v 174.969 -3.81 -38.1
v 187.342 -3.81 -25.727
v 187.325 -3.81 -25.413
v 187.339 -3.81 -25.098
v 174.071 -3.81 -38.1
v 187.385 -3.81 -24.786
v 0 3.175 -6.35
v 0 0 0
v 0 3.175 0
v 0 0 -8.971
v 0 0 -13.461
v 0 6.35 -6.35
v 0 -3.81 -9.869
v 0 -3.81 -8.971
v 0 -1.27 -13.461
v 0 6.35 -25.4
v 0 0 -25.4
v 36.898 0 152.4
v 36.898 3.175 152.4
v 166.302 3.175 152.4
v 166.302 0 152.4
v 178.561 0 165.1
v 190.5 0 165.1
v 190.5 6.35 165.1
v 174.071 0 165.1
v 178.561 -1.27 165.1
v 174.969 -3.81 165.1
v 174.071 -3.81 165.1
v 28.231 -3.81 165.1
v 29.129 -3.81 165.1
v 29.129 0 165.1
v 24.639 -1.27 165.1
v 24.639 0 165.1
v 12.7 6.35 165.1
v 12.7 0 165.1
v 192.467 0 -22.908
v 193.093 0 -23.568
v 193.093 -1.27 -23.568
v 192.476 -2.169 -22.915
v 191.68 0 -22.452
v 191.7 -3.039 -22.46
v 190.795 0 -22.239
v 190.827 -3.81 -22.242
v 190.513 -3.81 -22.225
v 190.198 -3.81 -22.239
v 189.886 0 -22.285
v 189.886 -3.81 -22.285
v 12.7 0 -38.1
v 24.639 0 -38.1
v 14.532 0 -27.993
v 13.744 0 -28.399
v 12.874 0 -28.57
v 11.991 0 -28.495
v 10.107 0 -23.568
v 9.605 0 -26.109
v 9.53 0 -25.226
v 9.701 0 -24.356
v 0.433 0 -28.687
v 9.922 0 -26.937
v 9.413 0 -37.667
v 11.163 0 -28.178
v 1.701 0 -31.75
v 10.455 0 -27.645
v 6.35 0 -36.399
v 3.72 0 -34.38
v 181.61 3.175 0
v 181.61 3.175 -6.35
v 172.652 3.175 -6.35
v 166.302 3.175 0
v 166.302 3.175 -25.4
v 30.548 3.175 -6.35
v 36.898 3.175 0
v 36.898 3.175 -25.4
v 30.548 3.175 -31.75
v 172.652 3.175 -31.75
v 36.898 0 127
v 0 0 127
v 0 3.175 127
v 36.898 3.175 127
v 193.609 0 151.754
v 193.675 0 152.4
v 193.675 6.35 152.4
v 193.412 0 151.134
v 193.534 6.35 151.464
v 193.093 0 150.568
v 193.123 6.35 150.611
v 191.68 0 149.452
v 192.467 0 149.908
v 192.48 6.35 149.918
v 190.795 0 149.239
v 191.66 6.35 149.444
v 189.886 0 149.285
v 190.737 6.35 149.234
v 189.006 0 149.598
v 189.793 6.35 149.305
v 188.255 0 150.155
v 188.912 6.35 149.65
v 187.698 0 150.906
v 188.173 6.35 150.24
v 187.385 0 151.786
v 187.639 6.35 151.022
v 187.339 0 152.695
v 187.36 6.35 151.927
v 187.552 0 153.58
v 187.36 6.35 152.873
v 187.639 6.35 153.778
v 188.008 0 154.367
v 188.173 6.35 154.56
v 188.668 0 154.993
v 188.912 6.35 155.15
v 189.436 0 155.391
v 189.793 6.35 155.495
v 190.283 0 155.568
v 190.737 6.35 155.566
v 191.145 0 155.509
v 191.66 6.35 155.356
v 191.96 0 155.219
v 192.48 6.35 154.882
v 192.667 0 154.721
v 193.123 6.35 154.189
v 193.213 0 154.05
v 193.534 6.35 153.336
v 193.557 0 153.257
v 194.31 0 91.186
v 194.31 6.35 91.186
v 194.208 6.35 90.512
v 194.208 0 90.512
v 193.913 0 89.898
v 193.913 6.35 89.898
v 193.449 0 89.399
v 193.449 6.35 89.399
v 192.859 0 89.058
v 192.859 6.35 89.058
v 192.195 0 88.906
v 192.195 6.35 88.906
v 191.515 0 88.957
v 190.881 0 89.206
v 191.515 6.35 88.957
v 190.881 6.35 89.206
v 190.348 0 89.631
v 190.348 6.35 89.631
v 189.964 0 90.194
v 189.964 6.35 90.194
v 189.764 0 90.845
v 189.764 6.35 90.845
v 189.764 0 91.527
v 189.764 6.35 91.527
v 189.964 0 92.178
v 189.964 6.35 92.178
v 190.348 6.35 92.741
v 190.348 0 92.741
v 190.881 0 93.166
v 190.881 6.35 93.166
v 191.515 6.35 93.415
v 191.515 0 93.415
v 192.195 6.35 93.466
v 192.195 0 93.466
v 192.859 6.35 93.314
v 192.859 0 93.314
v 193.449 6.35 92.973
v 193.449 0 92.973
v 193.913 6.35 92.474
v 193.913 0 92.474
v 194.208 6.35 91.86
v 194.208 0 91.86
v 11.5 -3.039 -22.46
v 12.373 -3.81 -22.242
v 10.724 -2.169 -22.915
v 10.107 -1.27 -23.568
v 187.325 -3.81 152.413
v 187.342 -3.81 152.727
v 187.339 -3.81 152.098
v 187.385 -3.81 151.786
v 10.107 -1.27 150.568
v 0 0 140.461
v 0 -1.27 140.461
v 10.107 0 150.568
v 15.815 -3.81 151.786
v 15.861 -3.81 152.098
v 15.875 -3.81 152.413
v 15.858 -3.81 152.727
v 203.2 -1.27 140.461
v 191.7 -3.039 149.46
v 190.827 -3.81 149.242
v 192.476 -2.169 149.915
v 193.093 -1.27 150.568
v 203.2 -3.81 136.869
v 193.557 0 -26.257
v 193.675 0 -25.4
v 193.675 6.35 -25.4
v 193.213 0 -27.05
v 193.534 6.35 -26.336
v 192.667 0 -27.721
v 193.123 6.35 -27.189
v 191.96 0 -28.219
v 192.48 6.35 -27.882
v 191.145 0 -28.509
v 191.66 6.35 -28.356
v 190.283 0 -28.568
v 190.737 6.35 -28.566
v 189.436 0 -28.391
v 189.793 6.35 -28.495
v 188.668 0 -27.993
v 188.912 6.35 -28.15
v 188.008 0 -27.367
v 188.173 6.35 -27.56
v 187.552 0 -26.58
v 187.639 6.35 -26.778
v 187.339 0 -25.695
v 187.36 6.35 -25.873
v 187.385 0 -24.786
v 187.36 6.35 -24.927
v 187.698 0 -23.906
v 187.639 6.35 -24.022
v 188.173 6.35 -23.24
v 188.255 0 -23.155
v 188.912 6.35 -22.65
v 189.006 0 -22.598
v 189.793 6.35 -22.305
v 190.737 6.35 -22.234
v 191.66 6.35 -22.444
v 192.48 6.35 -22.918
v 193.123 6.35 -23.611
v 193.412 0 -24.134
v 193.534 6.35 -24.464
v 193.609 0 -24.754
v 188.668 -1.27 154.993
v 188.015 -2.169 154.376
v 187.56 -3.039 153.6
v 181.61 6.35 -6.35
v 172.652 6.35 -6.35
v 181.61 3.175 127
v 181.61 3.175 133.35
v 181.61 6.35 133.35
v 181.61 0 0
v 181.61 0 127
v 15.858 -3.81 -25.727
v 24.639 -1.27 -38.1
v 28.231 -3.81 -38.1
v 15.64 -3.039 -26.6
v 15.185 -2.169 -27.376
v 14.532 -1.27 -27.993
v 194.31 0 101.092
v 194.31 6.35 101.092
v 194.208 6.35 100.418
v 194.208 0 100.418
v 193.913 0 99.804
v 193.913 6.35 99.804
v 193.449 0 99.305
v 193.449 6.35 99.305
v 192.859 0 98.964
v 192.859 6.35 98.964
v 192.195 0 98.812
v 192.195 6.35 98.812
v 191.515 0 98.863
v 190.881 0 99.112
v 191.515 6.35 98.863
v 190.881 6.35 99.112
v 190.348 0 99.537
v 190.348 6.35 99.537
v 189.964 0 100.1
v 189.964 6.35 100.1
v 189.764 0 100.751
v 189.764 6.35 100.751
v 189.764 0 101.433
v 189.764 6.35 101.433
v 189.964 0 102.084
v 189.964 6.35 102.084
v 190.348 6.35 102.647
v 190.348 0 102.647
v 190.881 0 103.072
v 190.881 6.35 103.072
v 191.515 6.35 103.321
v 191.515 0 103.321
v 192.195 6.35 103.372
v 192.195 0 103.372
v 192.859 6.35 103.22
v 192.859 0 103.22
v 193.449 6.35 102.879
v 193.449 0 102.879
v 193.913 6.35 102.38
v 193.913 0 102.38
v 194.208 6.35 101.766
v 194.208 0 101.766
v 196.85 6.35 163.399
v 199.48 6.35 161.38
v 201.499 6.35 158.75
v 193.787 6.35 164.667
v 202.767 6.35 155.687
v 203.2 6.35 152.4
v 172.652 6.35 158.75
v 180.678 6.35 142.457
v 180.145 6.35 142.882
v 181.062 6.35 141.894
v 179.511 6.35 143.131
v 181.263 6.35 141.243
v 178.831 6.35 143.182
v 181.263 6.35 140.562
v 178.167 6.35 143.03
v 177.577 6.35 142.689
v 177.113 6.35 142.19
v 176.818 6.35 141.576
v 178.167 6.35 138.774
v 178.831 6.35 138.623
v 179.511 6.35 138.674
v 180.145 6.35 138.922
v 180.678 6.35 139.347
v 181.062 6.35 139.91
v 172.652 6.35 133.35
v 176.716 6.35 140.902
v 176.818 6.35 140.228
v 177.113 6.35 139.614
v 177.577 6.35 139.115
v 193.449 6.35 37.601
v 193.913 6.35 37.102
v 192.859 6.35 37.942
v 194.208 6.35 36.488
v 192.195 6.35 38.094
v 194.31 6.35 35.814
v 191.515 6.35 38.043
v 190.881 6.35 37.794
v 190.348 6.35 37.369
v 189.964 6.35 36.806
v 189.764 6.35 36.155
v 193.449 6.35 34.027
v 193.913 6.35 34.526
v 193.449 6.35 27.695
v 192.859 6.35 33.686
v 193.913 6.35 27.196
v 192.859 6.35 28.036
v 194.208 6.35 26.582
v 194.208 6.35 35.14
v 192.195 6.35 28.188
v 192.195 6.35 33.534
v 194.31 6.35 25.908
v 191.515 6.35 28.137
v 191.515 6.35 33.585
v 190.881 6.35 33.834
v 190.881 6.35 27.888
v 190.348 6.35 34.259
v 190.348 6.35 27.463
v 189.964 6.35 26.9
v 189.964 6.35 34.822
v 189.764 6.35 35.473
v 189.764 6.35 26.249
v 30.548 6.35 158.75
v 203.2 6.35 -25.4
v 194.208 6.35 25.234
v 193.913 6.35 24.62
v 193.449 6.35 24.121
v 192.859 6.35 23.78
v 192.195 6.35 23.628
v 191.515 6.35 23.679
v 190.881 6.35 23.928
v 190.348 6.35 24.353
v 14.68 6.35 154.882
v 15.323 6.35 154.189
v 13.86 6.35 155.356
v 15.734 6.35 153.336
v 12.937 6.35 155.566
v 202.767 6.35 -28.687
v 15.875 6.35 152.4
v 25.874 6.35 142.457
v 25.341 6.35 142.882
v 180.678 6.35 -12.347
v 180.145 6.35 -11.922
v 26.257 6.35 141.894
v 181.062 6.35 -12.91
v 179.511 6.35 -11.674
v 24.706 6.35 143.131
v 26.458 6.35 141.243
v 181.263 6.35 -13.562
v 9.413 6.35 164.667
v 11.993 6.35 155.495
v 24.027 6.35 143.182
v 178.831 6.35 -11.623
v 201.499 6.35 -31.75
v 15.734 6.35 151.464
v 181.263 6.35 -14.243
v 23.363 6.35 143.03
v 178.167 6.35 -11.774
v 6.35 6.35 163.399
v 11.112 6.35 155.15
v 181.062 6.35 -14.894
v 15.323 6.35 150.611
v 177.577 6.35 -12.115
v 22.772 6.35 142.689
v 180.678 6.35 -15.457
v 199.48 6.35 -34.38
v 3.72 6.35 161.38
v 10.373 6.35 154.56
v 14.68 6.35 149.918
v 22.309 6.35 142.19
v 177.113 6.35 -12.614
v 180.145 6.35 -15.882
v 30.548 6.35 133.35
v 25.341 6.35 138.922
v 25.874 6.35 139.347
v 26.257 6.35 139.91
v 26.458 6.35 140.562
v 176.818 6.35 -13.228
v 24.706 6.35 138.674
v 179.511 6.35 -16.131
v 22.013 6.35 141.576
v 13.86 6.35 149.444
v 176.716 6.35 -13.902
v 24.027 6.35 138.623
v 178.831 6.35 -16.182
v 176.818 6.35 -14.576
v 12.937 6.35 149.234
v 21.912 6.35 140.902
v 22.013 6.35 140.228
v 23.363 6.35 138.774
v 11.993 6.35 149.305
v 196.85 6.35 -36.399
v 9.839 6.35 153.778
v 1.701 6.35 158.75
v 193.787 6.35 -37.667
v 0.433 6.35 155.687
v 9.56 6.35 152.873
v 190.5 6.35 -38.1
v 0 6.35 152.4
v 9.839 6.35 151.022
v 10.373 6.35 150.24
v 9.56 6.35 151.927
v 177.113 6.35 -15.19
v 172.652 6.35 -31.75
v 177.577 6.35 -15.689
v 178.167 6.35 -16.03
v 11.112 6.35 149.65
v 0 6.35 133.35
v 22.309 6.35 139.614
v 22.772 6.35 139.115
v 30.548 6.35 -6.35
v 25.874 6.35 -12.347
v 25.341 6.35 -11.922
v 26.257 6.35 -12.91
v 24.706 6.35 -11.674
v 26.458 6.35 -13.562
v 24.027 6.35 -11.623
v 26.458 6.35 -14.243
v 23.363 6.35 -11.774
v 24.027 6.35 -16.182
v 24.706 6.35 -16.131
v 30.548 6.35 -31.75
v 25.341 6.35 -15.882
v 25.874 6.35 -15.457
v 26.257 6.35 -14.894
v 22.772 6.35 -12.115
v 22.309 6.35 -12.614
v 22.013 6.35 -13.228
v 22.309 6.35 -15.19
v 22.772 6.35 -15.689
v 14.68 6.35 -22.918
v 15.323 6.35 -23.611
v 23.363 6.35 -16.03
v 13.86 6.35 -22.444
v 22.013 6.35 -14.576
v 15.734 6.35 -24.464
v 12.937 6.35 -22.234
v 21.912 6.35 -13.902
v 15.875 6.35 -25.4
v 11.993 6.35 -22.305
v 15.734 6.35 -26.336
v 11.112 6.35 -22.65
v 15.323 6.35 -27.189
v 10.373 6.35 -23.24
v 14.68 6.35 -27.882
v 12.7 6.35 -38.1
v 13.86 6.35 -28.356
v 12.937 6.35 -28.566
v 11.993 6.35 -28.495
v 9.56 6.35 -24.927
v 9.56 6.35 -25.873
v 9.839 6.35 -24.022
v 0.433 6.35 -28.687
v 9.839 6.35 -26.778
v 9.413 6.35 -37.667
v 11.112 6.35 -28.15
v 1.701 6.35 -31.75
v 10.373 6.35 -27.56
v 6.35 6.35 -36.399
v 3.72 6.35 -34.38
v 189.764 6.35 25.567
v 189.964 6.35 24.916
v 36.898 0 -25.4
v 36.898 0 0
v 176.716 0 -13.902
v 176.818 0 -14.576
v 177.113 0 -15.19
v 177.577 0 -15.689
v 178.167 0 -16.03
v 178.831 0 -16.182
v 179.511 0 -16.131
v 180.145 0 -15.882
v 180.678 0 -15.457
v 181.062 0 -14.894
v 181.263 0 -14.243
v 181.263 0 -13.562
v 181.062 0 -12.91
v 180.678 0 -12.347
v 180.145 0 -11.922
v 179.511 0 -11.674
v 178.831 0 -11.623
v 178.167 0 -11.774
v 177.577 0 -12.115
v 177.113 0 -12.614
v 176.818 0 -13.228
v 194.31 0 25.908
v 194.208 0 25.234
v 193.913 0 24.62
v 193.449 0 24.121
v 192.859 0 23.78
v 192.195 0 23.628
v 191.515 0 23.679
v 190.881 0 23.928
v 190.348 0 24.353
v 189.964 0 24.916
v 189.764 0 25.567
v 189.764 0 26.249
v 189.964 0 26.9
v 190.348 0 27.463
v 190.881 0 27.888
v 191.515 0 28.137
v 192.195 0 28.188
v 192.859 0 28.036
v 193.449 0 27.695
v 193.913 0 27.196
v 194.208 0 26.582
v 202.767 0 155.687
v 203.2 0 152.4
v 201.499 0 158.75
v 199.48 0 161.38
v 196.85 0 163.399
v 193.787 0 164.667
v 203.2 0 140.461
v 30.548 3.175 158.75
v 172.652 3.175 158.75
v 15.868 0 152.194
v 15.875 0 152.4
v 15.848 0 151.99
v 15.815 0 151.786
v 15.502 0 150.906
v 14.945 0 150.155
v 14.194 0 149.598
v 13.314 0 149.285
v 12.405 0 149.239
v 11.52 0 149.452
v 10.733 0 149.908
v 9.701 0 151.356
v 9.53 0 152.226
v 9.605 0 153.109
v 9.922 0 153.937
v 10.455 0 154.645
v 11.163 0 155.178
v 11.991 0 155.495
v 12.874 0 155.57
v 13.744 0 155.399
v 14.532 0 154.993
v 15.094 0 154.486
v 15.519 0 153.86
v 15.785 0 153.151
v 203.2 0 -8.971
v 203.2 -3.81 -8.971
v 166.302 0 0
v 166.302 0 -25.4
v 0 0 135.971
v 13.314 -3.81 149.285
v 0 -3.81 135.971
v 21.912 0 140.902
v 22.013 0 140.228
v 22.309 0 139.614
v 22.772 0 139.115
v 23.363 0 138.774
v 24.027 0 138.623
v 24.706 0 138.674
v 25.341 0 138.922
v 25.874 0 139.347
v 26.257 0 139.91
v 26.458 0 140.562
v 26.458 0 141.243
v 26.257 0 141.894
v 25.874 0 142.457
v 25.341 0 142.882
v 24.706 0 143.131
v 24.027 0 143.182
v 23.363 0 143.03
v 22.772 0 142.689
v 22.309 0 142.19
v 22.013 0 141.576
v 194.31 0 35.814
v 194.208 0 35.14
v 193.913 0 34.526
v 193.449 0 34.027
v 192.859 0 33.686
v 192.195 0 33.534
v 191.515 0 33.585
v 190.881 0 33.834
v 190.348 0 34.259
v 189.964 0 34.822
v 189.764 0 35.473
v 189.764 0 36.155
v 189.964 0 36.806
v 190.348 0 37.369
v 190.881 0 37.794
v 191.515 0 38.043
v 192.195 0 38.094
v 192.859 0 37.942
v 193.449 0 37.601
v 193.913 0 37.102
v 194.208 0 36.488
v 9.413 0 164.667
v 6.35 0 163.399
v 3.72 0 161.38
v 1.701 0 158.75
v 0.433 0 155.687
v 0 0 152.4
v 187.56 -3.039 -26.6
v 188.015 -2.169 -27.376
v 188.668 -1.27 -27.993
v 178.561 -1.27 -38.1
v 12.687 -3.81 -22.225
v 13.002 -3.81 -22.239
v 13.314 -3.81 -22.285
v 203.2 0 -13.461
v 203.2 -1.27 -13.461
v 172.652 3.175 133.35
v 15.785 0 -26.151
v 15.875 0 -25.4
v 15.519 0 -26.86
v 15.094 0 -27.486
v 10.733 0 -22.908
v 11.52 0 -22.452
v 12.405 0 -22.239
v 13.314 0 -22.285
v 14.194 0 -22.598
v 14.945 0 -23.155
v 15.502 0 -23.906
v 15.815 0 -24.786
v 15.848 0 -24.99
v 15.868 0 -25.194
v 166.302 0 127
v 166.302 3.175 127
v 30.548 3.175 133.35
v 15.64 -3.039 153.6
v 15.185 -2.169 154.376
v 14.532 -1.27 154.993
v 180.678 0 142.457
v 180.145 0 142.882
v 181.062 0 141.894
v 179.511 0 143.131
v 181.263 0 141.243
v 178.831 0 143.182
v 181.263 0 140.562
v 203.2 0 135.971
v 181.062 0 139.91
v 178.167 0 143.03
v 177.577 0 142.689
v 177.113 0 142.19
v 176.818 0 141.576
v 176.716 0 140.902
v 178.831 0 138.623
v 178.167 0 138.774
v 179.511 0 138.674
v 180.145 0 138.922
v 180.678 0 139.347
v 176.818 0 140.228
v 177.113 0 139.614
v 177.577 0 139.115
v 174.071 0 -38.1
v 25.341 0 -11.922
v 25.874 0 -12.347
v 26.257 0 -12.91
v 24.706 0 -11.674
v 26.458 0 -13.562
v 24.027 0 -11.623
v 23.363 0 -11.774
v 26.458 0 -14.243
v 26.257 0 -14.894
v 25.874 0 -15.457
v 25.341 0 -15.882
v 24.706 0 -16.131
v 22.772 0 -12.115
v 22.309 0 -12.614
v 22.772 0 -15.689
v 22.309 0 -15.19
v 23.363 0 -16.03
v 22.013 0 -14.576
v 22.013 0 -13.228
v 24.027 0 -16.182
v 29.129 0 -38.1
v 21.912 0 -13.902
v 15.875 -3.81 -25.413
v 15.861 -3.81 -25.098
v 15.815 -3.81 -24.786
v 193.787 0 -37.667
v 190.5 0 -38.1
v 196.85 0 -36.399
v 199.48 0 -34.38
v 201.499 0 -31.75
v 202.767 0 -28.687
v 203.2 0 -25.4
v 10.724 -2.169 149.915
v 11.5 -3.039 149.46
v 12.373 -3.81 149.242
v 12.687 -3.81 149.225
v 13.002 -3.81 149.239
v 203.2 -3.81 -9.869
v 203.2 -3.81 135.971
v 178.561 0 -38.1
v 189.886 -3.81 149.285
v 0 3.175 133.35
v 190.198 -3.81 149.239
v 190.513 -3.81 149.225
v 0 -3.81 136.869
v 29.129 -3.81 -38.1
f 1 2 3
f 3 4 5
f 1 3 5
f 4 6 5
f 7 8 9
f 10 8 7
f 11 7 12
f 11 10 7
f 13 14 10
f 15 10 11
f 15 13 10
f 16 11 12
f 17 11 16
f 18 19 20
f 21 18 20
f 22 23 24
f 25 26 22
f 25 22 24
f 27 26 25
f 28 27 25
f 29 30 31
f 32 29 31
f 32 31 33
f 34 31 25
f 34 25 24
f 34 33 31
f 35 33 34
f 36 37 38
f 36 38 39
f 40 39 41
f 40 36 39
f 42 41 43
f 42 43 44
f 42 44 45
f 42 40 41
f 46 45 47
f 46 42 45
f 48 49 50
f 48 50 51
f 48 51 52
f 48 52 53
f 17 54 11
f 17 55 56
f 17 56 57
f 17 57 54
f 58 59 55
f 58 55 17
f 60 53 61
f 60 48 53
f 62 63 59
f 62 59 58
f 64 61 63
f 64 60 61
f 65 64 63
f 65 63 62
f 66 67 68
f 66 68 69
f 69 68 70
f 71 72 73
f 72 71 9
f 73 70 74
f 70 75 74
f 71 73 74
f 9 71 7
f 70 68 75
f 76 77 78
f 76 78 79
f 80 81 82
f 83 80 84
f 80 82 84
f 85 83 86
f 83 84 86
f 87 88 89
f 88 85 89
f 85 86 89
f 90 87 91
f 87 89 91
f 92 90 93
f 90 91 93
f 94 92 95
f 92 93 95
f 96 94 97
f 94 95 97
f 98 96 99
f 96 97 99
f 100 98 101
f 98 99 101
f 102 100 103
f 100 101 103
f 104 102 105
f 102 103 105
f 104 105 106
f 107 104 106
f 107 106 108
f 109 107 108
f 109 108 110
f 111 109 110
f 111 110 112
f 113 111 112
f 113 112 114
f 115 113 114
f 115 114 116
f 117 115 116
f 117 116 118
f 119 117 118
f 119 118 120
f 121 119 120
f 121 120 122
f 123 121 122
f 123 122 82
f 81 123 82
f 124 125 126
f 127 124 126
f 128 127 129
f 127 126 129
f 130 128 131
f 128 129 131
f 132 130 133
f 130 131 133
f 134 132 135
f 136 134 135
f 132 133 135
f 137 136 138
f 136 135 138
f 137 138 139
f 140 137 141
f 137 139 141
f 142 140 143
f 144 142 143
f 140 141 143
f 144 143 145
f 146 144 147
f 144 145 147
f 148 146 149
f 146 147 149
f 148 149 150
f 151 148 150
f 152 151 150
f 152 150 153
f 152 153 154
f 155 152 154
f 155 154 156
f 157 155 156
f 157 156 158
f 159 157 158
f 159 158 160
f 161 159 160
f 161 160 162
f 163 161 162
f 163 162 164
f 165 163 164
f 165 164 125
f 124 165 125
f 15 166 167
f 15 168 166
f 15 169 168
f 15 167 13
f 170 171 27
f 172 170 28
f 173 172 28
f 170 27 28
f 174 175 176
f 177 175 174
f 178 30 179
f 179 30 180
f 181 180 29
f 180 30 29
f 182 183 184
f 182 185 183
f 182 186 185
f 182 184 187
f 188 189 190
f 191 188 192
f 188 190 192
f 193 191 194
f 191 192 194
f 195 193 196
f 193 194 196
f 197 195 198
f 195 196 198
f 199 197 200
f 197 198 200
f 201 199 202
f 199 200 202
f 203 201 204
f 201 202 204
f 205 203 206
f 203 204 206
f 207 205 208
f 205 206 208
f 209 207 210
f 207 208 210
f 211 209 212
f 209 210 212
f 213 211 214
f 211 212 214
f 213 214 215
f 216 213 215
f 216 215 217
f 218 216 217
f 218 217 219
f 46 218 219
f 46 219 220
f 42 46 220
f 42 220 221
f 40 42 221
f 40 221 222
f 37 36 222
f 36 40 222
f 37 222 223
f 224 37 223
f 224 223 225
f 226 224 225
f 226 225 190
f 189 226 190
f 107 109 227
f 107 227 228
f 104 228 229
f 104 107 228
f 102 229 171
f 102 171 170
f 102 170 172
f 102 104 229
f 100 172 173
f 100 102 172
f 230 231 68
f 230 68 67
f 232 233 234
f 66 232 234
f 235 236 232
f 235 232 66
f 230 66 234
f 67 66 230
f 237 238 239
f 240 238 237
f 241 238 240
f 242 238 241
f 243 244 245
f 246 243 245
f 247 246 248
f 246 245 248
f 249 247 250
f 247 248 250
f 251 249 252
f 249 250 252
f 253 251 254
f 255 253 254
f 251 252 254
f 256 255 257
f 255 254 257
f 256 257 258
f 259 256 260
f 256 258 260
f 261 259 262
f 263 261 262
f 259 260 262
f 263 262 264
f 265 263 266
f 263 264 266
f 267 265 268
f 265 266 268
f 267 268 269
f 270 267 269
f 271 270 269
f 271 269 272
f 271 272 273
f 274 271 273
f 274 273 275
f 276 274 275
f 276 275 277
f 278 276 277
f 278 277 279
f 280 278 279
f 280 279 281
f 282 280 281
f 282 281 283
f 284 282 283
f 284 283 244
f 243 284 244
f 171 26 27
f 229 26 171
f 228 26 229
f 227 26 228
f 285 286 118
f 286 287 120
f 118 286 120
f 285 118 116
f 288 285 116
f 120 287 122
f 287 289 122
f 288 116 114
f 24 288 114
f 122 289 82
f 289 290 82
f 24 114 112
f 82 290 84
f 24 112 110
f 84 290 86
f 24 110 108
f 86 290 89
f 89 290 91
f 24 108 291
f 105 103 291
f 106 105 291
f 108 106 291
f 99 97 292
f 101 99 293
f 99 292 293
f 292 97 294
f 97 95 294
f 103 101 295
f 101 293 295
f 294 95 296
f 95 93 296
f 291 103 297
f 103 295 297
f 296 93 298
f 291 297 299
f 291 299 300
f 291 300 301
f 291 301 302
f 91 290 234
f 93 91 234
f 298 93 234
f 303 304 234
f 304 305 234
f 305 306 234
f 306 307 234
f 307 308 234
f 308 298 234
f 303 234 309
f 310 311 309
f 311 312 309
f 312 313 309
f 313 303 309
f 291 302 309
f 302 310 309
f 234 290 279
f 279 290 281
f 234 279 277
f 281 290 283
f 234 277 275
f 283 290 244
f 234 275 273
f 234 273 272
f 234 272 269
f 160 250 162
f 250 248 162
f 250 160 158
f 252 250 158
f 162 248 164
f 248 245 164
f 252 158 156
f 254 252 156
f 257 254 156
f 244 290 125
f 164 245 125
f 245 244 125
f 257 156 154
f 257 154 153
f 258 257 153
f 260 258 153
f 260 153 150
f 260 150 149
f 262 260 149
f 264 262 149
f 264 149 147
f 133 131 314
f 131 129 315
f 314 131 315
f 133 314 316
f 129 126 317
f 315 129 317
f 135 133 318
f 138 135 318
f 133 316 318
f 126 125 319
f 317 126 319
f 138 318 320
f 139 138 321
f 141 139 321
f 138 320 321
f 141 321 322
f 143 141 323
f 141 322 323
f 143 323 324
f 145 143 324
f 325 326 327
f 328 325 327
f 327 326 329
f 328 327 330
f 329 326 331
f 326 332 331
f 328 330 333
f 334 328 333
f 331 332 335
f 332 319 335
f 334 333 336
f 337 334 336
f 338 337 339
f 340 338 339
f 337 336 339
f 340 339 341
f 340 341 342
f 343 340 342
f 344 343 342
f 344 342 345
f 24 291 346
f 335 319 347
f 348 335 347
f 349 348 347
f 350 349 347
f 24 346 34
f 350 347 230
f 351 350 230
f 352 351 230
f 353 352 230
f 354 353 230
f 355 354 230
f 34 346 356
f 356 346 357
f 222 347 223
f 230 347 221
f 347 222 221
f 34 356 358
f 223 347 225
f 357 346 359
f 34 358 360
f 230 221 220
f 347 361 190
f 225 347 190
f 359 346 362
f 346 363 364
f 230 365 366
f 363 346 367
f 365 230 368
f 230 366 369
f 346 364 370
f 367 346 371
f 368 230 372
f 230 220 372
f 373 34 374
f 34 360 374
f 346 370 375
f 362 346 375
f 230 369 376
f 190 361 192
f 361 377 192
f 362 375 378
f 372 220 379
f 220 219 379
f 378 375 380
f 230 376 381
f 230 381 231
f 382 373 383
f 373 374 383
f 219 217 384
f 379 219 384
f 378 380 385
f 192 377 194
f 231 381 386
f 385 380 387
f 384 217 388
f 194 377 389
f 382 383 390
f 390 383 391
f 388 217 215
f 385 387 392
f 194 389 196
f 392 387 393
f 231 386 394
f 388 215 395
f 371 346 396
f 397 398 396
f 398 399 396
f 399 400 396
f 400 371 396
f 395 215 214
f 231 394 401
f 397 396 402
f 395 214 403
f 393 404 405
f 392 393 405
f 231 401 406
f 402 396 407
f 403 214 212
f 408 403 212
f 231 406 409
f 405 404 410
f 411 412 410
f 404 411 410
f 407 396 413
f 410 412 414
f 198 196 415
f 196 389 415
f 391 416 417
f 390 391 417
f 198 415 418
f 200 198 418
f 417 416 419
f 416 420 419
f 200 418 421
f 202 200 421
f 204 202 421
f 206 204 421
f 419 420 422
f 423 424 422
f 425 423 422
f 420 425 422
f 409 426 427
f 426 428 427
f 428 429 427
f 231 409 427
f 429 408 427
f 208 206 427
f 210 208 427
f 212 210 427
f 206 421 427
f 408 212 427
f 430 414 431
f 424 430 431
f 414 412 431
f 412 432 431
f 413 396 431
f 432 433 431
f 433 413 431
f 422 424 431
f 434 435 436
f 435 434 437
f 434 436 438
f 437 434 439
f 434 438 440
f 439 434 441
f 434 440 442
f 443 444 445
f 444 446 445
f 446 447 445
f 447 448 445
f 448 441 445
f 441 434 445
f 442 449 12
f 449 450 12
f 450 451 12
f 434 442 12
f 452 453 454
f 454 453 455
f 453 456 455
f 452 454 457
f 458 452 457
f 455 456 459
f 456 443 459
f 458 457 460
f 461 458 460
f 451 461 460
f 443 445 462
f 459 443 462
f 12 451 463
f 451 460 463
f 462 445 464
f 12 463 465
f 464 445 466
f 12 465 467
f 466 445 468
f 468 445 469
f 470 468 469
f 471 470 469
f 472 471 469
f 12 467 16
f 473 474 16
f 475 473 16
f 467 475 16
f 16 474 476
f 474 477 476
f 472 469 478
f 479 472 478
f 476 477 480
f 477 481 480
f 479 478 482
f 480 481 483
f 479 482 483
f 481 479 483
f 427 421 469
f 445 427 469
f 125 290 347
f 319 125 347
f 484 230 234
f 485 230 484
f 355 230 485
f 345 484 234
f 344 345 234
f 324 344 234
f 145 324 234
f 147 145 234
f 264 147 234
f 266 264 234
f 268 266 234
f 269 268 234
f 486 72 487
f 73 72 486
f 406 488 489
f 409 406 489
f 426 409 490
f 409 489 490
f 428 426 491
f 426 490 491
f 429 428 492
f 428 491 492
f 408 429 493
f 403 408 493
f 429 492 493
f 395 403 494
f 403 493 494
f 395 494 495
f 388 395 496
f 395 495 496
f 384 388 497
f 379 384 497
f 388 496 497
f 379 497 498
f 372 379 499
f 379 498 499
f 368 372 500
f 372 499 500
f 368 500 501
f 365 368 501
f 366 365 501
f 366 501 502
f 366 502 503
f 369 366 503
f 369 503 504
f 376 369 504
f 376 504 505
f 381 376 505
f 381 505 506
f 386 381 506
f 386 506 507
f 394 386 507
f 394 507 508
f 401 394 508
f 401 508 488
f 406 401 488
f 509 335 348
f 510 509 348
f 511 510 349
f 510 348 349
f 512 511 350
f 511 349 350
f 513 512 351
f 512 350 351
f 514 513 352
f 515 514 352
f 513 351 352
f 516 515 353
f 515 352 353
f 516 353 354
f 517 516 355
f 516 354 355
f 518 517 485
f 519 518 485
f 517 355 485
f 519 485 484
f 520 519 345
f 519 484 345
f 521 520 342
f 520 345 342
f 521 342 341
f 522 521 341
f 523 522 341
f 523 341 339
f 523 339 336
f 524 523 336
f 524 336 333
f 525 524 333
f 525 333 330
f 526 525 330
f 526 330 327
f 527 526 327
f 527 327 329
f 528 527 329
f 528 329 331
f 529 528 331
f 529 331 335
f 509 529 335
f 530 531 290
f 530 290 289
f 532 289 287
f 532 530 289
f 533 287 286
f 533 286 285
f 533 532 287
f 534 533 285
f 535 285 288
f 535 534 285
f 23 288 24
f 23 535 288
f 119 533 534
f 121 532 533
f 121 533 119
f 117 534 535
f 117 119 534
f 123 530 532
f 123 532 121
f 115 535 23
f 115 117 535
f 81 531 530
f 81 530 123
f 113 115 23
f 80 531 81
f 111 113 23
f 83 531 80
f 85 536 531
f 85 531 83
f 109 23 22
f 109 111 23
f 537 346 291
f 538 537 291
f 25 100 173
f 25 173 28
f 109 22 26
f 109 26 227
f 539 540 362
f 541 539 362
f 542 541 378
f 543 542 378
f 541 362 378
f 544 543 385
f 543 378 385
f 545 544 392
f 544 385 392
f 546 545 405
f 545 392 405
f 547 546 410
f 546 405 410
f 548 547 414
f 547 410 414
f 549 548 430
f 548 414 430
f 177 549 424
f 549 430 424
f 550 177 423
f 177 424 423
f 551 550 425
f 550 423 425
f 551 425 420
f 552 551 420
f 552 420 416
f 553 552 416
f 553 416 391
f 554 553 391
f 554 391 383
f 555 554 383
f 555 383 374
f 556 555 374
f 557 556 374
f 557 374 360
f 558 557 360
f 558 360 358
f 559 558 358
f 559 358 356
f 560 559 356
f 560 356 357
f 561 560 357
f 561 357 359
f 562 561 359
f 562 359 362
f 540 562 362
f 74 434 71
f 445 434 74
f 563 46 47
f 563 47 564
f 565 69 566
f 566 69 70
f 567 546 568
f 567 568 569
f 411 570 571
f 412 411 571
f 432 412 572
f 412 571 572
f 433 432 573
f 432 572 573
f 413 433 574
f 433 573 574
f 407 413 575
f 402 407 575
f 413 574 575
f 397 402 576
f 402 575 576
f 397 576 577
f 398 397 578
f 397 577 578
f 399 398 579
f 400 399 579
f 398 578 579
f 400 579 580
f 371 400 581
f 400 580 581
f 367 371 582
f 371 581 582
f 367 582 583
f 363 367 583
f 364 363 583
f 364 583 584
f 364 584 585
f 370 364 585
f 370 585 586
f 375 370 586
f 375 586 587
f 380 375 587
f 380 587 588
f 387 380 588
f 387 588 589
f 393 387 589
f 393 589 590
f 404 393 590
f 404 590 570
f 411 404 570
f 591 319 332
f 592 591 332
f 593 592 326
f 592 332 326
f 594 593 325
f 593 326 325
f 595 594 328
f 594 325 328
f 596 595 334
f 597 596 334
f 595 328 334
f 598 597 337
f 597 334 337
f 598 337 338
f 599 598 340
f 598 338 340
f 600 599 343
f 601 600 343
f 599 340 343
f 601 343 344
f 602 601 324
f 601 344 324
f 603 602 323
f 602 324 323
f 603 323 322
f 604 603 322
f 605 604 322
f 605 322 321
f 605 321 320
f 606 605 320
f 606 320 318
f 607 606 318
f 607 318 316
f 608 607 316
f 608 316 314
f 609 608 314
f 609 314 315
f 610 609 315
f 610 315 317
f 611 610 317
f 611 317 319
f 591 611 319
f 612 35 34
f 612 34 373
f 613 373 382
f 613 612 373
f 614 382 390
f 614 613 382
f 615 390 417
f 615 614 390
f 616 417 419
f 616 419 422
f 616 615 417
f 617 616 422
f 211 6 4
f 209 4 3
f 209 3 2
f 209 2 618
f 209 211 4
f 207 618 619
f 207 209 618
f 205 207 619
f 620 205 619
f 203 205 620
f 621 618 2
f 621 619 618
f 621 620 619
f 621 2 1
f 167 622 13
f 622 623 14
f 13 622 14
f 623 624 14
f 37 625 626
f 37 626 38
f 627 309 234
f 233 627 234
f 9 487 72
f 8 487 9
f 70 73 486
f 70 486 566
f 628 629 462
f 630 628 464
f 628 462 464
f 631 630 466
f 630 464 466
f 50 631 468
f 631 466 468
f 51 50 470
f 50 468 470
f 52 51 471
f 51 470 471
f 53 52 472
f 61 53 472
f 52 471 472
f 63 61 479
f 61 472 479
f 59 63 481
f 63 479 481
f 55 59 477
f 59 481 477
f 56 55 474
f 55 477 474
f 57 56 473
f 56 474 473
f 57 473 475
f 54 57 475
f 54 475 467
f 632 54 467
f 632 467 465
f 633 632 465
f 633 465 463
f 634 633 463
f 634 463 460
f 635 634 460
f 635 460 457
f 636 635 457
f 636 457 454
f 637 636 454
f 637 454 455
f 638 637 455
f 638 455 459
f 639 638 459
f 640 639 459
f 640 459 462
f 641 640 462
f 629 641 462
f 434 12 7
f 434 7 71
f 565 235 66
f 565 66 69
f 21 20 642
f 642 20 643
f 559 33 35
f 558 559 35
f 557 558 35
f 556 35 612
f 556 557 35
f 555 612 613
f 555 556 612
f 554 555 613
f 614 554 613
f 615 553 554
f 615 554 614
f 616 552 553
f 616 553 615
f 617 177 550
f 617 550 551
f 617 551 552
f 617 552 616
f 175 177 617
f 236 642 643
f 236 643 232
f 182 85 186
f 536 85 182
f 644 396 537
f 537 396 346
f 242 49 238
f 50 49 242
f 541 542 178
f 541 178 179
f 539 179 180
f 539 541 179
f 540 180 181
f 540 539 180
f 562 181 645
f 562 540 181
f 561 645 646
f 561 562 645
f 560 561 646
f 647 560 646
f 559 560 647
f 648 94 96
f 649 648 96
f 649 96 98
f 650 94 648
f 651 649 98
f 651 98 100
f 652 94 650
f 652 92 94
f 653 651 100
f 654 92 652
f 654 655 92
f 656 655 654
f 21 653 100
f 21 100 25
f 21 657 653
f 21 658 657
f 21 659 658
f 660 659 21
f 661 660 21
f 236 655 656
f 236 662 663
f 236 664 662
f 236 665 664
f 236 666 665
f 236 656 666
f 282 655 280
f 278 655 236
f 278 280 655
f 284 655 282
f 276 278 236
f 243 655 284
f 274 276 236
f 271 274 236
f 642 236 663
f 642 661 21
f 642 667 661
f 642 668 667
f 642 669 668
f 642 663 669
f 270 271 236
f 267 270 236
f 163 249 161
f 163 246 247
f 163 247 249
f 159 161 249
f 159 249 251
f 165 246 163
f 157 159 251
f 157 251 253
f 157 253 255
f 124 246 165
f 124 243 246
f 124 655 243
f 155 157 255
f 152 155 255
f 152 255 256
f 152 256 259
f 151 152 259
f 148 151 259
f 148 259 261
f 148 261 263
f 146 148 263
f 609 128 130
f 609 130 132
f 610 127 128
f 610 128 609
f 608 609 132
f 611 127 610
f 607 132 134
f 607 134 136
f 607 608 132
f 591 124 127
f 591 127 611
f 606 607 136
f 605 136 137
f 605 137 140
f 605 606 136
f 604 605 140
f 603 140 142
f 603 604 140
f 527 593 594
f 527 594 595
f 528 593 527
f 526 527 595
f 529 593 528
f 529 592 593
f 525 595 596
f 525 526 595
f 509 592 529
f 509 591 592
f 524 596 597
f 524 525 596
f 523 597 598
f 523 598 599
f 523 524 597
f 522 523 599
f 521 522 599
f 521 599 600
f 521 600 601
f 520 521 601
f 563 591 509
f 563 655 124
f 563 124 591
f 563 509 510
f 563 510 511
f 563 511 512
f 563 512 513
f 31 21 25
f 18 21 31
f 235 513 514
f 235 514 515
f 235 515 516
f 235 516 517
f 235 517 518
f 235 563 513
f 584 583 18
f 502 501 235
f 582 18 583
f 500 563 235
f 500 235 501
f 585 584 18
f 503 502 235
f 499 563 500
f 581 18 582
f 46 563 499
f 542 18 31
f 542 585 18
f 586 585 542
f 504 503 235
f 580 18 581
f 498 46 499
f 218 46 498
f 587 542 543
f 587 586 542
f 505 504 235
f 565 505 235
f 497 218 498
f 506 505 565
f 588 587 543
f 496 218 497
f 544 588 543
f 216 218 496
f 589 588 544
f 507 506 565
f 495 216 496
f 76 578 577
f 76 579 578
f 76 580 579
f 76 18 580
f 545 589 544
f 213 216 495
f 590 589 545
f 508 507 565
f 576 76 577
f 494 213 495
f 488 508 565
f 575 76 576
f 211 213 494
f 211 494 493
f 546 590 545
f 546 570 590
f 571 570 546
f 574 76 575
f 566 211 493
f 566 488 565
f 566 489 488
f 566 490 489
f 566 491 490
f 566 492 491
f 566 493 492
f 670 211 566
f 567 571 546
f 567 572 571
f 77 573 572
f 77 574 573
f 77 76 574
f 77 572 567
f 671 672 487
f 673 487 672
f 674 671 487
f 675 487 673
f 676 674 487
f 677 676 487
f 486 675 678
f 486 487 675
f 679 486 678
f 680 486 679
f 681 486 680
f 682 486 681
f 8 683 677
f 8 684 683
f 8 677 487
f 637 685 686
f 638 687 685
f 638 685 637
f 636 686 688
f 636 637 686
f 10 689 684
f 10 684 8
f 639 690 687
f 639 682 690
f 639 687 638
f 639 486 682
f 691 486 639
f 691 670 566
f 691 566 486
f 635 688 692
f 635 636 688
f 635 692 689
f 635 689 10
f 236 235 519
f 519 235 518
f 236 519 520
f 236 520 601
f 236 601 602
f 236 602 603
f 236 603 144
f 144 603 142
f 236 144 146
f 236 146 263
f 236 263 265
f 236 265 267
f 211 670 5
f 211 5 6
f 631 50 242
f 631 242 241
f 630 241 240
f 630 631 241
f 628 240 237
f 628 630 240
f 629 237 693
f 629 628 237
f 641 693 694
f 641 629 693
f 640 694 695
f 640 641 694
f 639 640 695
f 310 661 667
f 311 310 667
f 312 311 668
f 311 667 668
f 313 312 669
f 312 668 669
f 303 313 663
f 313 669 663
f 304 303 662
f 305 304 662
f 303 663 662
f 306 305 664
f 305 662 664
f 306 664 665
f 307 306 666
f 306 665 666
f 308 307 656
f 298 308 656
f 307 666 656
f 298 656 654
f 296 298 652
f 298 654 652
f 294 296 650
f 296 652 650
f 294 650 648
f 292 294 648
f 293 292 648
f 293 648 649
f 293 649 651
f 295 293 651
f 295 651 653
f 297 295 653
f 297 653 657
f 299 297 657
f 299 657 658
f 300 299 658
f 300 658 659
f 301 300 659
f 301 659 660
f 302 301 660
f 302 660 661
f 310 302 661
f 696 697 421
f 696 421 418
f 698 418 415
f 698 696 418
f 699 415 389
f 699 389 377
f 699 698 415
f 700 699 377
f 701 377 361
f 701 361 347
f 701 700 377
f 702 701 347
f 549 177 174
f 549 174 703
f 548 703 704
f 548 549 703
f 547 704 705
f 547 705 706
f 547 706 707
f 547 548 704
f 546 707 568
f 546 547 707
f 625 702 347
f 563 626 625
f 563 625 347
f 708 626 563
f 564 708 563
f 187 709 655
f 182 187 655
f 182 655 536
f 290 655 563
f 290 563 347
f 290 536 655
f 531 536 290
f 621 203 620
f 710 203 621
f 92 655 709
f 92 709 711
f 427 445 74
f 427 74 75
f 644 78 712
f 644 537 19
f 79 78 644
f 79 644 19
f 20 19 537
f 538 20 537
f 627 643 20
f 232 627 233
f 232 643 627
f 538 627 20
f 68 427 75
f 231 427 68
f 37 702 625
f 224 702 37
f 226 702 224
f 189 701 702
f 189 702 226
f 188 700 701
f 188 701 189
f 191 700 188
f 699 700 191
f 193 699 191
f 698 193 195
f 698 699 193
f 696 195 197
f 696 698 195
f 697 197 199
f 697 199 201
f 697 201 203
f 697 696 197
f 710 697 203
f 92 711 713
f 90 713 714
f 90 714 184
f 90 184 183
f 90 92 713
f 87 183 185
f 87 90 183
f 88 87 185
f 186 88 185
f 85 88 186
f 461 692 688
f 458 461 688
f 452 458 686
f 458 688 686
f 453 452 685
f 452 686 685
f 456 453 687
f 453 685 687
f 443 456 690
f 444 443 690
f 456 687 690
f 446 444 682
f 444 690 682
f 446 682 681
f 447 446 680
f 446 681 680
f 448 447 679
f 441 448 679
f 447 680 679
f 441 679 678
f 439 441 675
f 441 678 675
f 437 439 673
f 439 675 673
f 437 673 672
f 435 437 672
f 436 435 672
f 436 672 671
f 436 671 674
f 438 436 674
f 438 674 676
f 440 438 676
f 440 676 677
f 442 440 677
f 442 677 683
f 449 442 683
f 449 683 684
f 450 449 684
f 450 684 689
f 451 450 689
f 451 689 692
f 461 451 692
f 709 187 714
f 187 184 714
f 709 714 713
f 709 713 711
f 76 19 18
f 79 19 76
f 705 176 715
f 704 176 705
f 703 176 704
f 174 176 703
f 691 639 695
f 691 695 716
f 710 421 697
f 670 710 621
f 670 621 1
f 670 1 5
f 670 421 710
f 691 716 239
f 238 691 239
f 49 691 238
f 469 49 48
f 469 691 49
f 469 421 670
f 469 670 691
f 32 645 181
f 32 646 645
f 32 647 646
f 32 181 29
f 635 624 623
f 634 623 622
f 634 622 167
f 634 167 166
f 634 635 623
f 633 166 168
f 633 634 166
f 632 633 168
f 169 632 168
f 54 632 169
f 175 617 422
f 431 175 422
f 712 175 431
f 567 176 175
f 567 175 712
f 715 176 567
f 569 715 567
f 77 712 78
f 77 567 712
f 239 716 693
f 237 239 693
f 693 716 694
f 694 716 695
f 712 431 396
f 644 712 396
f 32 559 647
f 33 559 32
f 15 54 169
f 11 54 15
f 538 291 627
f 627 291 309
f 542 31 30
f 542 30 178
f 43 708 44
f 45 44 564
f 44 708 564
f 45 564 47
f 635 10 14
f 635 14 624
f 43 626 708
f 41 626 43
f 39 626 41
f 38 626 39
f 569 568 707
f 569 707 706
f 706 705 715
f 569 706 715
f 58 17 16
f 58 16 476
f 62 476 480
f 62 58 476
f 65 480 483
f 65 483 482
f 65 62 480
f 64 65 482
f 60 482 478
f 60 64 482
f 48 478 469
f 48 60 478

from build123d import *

# Parameters (mm, degrees)
BOSS_EXTRUDE2_DEPTH = 6.35
SKETCH2_R           = 3.175
CUT_EXTRUDE1_DEPTH  = 7.35
SKETCH7_R           = 2.286
CUT_EXTRUDE3_DEPTH  = 12.7
SKETCH8_R           = 2.286
CUT_EXTRUDE4_DEPTH  = 7.35
SKETCH9_W           = 129.404437756
SKETCH9_H           = 25.4
CUT_EXTRUDE5_DEPTH  = 7.35
CUT_EXTRUDE6_DEPTH  = 3.175
BOSS_EXTRUDE3_DEPTH = 3.81
CHAMFER1_SIZE       = 2.54


with BuildPart() as part:
    # Sketch1 → Boss-Extrude2 (new body)
    with BuildSketch(Plane(origin=(0, 0, 0), x_dir=(1, 0, 0), z_dir=(0, 1, 0))):
        with BuildLine():
            Line((0, 0), (0, 25.4))
            ThreePointArc((0, 25.4), (3.719743879, 34.380256121), (12.7, 38.1))
            Line((12.7, 38.1), (190.5, 38.1))
            ThreePointArc((190.5, 38.1), (199.480256121, 34.380256121), (203.2, 25.4))
            Line((203.2, 25.4), (203.2, -152.4))
            ThreePointArc((203.2, -152.4), (199.480256121, -161.380256121), (190.5, -165.1))
            Line((190.5, -165.1), (12.7, -165.1))
            ThreePointArc((12.7, -165.1), (3.719743879, -161.380256121), (0, -152.4))
            Line((0, -152.4), (0, -127))
            Line((0, -127), (181.61, -127))
            Line((181.61, -127), (181.61, 0))
            Line((181.61, 0), (0, 0))
        make_face()
    extrude(amount=BOSS_EXTRUDE2_DEPTH)

    # Sketch2 → Cut-Extrude1 (cut, through all)
    with BuildSketch(Plane(origin=(0, 6.35, 0), x_dir=(1, 0, 0), z_dir=(0, 1, 0))):
        with Locations((12.7, 25.4)):
            Circle(SKETCH2_R)
        with Locations((190.5, 25.4)):
            Circle(SKETCH2_R)
        with Locations((190.5, -152.4)):
            Circle(SKETCH2_R)
        with Locations((12.7, -152.4)):
            Circle(SKETCH2_R)
    extrude(amount=-CUT_EXTRUDE1_DEPTH, mode=Mode.SUBTRACT)

    # Sketch7 → Cut-Extrude3 (cut)
    with BuildSketch(Plane(origin=(0, 6.35, 0), x_dir=(1, 0, 0), z_dir=(0, 1, 0))):
        with Locations((192.024, -101.092)):
            Circle(SKETCH7_R)
        with Locations((192.024, -91.186)):
            Circle(SKETCH7_R)
        with Locations((192.024, -35.814)):
            Circle(SKETCH7_R)
        with Locations((192.024, -25.908)):
            Circle(SKETCH7_R)
    extrude(amount=-CUT_EXTRUDE3_DEPTH, mode=Mode.SUBTRACT)

    # Sketch8 → Cut-Extrude4 (cut, through all)
    with BuildSketch(Plane(origin=(0, 0, 0), x_dir=(-1, 0, 0), z_dir=(0, -1, 0))):
        with Locations((-24.197781122, 13.902218878)):
            Circle(SKETCH8_R)
        with Locations((-24.197781122, -140.902218878)):
            Circle(SKETCH8_R)
        with Locations((-179.002218878, -140.902218878)):
            Circle(SKETCH8_R)
        with Locations((-179.002218878, 13.902218878)):
            Circle(SKETCH8_R)
    extrude(amount=-CUT_EXTRUDE4_DEPTH, mode=Mode.SUBTRACT)

    # Sketch9 → Cut-Extrude5 (cut, through all)
    with BuildSketch(Plane(origin=(0, 6.35, 0), x_dir=(1, 0, 0), z_dir=(0, 1, 0))):
        with Locations((101.6, 12.7)):
            Rectangle(SKETCH9_W, SKETCH9_H)
        with Locations((101.6, -139.7)):
            Rectangle(SKETCH9_W, SKETCH9_H)
    extrude(amount=-CUT_EXTRUDE5_DEPTH, mode=Mode.SUBTRACT)

    # Sketch10 → Cut-Extrude6 (cut)
    with BuildSketch(Plane(origin=(0, 6.35, 0), x_dir=(1, 0, 0), z_dir=(0, 1, 0))):
        Polygon((0, 6.35), (30.547781122, 6.35), (30.547781122, 31.75), (172.652218878, 31.75), (172.652218878, 6.35), (181.61, 6.35), (181.61, 0), (166.302218878, 0), (166.302218878, 25.4), (36.897781122, 25.4), (36.897781122, 0), (0, 0), align=None)
        Polygon((0, -127), (0, -133.35), (30.547781122, -133.35), (30.547781122, -158.75), (172.652218878, -158.75), (172.652218878, -133.35), (181.61, -133.35), (181.61, -127), (166.302218878, -127), (166.302218878, -152.4), (36.897781122, -152.4), (36.897781122, -127), align=None)
    extrude(amount=-CUT_EXTRUDE6_DEPTH, mode=Mode.SUBTRACT)

    # Sketch11 → Boss-Extrude3 (add)
    with BuildSketch(Plane.XZ):
        with BuildLine():
            Line((174.07128, -38.1), (187.384850533, -24.786429467))
            ThreePointArc((187.384850533, -24.786429467), (187.552268433, -26.579620112), (188.668154157, -27.993253903))
            Line((188.668154157, -27.993253903), (178.561408061, -38.1))
            Line((178.561408061, -38.1), (174.07128, -38.1))
        make_face()
        with BuildLine():
            Line((203.2, -8.97128), (203.2, -13.461408061))
            Line((203.2, -13.461408061), (193.093253903, -23.568154157))
            ThreePointArc((193.093253903, -23.568154157), (191.679620112, -22.452268433), (189.886429467, -22.284850533))
            Line((189.886429467, -22.284850533), (203.2, -8.97128))
        make_face()
        with BuildLine():
            Line((10.106746097, -23.568154157), (0, -13.461408061))
            Line((0, -13.461408061), (0, -8.97128))
            Line((0, -8.97128), (13.313570533, -22.284850533))
            ThreePointArc((13.313570533, -22.284850533), (11.520379888, -22.452268433), (10.106746097, -23.568154157))
        make_face()
        with BuildLine():
            Line((15.815149467, -24.786429467), (29.12872, -38.1))
            Line((29.12872, -38.1), (24.638591939, -38.1))
            Line((24.638591939, -38.1), (14.531845843, -27.993253903))
            ThreePointArc((14.531845843, -27.993253903), (15.647731567, -26.579620112), (15.815149467, -24.786429467))
        make_face()
        with BuildLine():
            Line((14.531845843, 154.993253903), (24.638591939, 165.1))
            Line((24.638591939, 165.1), (29.12872, 165.1))
            Line((29.12872, 165.1), (15.815149467, 151.786429467))
            ThreePointArc((15.815149467, 151.786429467), (15.647731567, 153.579620112), (14.531845843, 154.993253903))
        make_face()
        with BuildLine():
            Line((13.313570533, 149.284850533), (0, 135.97128))
            Line((0, 135.97128), (0, 140.461408061))
            Line((0, 140.461408061), (10.106746097, 150.568154157))
            ThreePointArc((10.106746097, 150.568154157), (11.520379888, 149.452268433), (13.313570533, 149.284850533))
        make_face()
        with BuildLine():
            Line((193.093253903, 150.568154157), (203.2, 140.461408061))
            Line((203.2, 140.461408061), (203.2, 135.97128))
            Line((203.2, 135.97128), (189.886429467, 149.284850533))
            ThreePointArc((189.886429467, 149.284850533), (191.679620112, 149.452268433), (193.093253903, 150.568154157))
        make_face()
        with BuildLine():
            Line((187.384850533, 151.786429467), (174.07128, 165.1))
            Line((174.07128, 165.1), (178.561408061, 165.1))
            Line((178.561408061, 165.1), (188.668154157, 154.993253903))
            ThreePointArc((188.668154157, 154.993253903), (187.552268433, 153.579620112), (187.384850533, 151.786429467))
        make_face()
    extrude(amount=BOSS_EXTRUDE3_DEPTH)

    # Chamfer1
    chamfer1_edges = [part.edges().sort_by_distance(p)[0] for p in [
        (183.614781109, -3.81, -33.046626952),
        (198.146626952, -3.81, -18.514781109),
        (5.053373048, -3.81, -18.514781109),
        (19.585218891, -3.81, -33.046626952),
        (19.585218891, -3.81, 160.046626952),
        (5.053373048, -3.81, 145.514781109),
        (198.146626952, -3.81, 145.514781109),
        (183.614781109, -3.81, 160.046626952),
    ]]
    chamfer(chamfer1_edges, length=CHAMFER1_SIZE)


solid = part.part
